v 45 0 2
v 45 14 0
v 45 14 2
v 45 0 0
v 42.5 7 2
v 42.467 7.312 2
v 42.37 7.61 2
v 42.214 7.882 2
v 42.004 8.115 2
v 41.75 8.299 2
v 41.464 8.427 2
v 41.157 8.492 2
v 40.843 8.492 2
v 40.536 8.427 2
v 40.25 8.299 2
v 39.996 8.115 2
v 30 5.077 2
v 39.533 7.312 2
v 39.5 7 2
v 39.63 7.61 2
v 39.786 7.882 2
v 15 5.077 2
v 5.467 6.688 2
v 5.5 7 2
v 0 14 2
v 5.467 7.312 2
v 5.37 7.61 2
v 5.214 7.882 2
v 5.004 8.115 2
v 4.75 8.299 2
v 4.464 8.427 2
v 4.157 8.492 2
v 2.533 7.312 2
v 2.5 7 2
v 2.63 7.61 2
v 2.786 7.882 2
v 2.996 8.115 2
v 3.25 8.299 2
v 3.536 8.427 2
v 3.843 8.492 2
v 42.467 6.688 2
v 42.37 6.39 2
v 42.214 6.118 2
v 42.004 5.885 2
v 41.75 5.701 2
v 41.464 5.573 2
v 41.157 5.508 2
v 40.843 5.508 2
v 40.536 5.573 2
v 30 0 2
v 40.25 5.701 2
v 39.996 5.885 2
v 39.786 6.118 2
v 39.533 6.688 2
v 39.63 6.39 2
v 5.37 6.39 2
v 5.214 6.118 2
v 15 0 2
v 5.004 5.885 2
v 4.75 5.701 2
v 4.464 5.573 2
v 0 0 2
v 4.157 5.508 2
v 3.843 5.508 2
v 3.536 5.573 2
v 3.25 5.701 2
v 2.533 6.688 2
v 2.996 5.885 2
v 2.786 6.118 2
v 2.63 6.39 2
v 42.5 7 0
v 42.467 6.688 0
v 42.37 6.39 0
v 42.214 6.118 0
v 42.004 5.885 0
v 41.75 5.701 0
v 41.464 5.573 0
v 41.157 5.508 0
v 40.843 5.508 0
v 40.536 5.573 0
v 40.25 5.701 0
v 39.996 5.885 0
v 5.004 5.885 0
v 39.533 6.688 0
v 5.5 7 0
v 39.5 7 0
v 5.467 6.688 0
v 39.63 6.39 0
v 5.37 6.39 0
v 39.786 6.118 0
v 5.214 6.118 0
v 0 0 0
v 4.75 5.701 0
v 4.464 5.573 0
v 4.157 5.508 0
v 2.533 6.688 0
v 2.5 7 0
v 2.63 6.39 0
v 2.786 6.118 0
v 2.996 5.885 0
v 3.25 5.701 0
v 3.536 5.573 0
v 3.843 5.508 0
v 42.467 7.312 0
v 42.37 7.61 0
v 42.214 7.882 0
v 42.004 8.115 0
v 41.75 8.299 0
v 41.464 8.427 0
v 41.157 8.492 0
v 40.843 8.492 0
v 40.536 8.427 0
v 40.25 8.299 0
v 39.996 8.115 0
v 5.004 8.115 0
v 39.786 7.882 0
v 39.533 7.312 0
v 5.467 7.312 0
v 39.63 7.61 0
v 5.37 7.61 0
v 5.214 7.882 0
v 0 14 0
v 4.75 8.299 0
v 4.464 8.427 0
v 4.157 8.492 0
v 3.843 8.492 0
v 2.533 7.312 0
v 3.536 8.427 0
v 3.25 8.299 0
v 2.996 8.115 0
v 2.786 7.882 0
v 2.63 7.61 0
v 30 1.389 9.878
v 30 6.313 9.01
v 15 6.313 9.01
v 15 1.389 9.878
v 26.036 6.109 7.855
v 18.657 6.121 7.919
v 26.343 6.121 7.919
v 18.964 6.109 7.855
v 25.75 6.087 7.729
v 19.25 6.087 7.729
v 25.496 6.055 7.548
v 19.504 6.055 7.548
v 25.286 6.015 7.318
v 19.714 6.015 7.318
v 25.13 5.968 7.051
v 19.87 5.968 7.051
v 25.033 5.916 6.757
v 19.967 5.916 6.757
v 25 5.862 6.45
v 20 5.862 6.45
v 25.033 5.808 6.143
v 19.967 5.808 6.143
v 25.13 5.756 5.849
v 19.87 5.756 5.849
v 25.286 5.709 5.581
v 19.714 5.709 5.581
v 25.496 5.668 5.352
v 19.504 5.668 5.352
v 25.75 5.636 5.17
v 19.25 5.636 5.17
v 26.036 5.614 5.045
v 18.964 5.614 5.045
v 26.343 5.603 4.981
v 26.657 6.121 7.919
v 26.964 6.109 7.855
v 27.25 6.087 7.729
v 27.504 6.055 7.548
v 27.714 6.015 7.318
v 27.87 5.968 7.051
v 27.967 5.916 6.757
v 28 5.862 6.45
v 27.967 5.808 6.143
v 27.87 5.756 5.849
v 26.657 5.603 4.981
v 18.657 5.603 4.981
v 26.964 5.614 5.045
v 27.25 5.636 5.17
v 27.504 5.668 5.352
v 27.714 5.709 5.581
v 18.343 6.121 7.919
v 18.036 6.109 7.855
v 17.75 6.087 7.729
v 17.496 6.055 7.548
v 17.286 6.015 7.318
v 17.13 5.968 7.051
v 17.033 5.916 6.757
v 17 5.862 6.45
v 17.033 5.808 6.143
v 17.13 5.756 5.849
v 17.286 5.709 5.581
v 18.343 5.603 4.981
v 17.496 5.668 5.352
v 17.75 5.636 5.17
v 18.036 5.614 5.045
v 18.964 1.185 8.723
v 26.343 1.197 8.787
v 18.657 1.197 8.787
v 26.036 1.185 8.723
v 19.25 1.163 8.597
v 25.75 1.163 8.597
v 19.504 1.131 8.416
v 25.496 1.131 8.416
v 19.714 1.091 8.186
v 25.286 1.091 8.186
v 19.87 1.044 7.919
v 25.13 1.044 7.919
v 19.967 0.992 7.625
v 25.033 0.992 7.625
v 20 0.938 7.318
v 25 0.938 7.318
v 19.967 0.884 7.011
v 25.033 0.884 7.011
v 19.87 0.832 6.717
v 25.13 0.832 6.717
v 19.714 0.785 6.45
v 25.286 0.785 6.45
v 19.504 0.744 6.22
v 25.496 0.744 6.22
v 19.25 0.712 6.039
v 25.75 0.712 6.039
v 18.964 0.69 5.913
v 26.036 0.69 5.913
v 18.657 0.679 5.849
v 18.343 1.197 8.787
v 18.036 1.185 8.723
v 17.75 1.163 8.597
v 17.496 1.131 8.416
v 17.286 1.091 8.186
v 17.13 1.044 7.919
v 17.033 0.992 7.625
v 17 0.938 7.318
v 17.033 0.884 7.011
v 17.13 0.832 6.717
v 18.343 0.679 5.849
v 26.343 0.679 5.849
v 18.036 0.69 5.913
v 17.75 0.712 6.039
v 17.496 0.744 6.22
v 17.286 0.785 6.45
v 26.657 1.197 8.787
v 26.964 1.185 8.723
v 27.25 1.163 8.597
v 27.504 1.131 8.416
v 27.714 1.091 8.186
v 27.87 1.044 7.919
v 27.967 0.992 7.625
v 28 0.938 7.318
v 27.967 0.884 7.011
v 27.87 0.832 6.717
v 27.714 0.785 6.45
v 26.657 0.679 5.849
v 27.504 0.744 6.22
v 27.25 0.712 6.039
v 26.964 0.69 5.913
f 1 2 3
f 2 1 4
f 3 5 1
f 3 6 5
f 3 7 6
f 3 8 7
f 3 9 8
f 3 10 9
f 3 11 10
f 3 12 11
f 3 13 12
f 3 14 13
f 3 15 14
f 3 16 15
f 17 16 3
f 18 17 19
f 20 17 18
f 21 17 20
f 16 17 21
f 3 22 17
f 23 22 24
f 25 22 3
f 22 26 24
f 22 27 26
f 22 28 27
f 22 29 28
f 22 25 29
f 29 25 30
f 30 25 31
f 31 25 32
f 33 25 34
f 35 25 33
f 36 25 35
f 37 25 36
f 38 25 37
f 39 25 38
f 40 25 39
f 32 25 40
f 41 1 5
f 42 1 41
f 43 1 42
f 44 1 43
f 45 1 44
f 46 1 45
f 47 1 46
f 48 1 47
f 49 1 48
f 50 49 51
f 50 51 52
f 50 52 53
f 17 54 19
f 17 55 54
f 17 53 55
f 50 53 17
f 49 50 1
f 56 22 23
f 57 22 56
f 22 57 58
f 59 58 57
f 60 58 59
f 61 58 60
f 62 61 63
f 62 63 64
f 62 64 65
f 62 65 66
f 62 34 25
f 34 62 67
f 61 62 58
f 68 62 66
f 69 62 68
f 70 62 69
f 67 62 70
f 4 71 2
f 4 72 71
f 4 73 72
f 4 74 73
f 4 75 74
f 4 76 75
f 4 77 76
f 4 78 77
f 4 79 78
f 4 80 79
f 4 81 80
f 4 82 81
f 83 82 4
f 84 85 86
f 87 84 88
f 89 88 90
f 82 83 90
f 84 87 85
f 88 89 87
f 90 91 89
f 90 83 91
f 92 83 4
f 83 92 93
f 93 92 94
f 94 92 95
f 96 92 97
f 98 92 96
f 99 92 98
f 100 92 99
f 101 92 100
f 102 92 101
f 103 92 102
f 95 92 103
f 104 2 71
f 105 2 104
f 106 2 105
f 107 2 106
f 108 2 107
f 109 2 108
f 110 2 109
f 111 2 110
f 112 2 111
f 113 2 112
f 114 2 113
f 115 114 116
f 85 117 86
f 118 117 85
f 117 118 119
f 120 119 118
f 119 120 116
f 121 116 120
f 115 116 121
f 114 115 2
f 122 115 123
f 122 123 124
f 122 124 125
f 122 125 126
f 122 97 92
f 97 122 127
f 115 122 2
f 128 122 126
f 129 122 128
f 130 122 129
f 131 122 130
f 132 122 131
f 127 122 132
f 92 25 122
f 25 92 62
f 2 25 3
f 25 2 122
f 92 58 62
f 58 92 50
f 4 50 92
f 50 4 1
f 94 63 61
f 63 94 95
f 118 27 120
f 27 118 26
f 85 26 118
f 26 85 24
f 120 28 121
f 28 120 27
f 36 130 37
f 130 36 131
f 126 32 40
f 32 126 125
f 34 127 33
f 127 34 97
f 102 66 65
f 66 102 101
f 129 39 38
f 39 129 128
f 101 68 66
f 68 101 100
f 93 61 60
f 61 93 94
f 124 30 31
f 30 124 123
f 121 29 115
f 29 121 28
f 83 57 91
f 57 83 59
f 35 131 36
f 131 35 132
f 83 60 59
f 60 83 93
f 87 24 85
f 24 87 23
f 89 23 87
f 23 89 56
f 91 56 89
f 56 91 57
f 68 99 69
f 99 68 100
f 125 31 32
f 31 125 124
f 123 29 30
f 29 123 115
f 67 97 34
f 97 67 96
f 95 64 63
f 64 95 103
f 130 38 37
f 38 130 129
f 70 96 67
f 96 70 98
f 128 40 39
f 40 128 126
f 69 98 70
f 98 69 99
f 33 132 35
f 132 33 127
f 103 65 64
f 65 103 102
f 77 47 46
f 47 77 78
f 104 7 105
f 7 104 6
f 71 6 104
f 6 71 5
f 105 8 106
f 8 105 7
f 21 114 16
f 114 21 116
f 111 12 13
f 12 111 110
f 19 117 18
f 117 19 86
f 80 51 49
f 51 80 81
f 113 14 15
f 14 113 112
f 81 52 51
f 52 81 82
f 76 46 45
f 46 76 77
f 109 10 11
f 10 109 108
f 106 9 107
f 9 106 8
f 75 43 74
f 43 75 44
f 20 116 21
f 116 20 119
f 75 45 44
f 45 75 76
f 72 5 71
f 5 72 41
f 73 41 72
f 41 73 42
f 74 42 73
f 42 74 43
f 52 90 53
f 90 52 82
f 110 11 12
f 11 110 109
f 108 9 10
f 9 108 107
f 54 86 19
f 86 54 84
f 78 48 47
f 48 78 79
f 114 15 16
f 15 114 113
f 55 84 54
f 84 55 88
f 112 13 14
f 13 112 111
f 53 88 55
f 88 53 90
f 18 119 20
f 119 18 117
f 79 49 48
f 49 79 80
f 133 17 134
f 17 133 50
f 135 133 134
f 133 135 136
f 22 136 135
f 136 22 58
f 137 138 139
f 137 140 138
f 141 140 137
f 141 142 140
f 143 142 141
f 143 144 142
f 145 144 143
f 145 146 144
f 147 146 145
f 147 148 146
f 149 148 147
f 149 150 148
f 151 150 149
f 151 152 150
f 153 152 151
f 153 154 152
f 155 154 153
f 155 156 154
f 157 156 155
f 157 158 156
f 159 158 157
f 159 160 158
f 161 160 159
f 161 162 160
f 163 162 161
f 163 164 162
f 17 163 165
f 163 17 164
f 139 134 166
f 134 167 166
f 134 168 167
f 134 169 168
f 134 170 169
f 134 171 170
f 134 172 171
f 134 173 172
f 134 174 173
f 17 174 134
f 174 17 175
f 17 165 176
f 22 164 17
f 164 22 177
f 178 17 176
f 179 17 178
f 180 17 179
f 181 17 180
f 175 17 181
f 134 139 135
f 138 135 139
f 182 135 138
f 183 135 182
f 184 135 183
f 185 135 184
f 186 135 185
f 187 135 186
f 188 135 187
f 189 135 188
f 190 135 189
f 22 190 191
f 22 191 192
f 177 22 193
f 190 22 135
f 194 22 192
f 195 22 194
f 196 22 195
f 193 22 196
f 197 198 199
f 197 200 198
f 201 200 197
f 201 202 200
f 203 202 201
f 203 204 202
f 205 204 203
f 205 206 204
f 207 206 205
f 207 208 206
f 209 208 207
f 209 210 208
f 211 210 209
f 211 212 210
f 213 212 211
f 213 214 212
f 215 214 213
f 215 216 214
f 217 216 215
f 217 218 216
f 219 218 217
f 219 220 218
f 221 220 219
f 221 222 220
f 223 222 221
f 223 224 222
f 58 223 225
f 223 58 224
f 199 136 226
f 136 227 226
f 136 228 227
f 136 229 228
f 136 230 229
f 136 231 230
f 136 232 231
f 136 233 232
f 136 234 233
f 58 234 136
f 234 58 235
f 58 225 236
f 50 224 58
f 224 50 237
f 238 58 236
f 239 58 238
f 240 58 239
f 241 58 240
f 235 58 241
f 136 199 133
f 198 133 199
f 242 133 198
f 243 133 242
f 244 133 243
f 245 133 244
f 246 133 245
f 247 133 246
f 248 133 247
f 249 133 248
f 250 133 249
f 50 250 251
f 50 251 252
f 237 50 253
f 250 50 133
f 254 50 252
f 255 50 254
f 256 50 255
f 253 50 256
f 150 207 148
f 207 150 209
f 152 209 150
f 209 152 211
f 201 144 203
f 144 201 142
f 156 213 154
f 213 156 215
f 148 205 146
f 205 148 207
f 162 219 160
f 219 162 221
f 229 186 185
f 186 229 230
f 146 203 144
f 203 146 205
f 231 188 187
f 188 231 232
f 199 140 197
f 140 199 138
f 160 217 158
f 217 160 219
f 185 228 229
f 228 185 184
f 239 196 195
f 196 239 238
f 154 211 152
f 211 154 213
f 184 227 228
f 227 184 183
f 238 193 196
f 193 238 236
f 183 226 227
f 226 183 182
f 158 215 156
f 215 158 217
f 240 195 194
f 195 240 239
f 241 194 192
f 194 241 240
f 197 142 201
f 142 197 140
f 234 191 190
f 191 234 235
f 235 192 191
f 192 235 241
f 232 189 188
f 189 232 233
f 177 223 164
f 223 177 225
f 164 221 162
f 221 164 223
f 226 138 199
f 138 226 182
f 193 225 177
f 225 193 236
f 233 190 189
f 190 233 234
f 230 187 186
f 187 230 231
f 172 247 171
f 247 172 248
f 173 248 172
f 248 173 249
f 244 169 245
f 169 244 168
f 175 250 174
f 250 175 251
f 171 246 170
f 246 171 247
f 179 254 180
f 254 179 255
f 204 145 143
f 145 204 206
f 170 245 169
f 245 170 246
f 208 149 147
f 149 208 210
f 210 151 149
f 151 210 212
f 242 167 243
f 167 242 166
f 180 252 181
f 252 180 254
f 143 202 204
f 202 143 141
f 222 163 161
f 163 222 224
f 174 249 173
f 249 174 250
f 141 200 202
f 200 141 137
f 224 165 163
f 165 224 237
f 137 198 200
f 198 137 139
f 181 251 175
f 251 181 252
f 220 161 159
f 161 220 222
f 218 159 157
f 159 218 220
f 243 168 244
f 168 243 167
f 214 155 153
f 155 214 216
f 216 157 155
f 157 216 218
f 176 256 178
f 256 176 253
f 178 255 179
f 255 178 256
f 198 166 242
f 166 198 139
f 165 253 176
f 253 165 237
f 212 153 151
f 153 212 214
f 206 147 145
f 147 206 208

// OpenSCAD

angle = 10;

difference(){



union(){

difference(){ 
cube([45,14,2]);
translate([4,7,0-1])
    cylinder(r=1.5,h=10,$fs = 0.1);
translate([4+37,7,0-1])
    cylinder(r=1.5,h=10,$fs = 0.1); 
}



translate([15,0,2])
rotate([-angle,0,0])

difference(){ 
cube([15,5,8]);
translate([3.5,7,5.4])
rotate([90,0,0])
    cylinder(r=1.5,h=10,$fs = 0.1);
translate([3.5+8,7,5.4])
rotate([90,0,0])
    cylinder(r=1.5,h=10,$fs = 0.1); 
}


}



translate([0,0,-10])
cube([45,20,10]);
}
